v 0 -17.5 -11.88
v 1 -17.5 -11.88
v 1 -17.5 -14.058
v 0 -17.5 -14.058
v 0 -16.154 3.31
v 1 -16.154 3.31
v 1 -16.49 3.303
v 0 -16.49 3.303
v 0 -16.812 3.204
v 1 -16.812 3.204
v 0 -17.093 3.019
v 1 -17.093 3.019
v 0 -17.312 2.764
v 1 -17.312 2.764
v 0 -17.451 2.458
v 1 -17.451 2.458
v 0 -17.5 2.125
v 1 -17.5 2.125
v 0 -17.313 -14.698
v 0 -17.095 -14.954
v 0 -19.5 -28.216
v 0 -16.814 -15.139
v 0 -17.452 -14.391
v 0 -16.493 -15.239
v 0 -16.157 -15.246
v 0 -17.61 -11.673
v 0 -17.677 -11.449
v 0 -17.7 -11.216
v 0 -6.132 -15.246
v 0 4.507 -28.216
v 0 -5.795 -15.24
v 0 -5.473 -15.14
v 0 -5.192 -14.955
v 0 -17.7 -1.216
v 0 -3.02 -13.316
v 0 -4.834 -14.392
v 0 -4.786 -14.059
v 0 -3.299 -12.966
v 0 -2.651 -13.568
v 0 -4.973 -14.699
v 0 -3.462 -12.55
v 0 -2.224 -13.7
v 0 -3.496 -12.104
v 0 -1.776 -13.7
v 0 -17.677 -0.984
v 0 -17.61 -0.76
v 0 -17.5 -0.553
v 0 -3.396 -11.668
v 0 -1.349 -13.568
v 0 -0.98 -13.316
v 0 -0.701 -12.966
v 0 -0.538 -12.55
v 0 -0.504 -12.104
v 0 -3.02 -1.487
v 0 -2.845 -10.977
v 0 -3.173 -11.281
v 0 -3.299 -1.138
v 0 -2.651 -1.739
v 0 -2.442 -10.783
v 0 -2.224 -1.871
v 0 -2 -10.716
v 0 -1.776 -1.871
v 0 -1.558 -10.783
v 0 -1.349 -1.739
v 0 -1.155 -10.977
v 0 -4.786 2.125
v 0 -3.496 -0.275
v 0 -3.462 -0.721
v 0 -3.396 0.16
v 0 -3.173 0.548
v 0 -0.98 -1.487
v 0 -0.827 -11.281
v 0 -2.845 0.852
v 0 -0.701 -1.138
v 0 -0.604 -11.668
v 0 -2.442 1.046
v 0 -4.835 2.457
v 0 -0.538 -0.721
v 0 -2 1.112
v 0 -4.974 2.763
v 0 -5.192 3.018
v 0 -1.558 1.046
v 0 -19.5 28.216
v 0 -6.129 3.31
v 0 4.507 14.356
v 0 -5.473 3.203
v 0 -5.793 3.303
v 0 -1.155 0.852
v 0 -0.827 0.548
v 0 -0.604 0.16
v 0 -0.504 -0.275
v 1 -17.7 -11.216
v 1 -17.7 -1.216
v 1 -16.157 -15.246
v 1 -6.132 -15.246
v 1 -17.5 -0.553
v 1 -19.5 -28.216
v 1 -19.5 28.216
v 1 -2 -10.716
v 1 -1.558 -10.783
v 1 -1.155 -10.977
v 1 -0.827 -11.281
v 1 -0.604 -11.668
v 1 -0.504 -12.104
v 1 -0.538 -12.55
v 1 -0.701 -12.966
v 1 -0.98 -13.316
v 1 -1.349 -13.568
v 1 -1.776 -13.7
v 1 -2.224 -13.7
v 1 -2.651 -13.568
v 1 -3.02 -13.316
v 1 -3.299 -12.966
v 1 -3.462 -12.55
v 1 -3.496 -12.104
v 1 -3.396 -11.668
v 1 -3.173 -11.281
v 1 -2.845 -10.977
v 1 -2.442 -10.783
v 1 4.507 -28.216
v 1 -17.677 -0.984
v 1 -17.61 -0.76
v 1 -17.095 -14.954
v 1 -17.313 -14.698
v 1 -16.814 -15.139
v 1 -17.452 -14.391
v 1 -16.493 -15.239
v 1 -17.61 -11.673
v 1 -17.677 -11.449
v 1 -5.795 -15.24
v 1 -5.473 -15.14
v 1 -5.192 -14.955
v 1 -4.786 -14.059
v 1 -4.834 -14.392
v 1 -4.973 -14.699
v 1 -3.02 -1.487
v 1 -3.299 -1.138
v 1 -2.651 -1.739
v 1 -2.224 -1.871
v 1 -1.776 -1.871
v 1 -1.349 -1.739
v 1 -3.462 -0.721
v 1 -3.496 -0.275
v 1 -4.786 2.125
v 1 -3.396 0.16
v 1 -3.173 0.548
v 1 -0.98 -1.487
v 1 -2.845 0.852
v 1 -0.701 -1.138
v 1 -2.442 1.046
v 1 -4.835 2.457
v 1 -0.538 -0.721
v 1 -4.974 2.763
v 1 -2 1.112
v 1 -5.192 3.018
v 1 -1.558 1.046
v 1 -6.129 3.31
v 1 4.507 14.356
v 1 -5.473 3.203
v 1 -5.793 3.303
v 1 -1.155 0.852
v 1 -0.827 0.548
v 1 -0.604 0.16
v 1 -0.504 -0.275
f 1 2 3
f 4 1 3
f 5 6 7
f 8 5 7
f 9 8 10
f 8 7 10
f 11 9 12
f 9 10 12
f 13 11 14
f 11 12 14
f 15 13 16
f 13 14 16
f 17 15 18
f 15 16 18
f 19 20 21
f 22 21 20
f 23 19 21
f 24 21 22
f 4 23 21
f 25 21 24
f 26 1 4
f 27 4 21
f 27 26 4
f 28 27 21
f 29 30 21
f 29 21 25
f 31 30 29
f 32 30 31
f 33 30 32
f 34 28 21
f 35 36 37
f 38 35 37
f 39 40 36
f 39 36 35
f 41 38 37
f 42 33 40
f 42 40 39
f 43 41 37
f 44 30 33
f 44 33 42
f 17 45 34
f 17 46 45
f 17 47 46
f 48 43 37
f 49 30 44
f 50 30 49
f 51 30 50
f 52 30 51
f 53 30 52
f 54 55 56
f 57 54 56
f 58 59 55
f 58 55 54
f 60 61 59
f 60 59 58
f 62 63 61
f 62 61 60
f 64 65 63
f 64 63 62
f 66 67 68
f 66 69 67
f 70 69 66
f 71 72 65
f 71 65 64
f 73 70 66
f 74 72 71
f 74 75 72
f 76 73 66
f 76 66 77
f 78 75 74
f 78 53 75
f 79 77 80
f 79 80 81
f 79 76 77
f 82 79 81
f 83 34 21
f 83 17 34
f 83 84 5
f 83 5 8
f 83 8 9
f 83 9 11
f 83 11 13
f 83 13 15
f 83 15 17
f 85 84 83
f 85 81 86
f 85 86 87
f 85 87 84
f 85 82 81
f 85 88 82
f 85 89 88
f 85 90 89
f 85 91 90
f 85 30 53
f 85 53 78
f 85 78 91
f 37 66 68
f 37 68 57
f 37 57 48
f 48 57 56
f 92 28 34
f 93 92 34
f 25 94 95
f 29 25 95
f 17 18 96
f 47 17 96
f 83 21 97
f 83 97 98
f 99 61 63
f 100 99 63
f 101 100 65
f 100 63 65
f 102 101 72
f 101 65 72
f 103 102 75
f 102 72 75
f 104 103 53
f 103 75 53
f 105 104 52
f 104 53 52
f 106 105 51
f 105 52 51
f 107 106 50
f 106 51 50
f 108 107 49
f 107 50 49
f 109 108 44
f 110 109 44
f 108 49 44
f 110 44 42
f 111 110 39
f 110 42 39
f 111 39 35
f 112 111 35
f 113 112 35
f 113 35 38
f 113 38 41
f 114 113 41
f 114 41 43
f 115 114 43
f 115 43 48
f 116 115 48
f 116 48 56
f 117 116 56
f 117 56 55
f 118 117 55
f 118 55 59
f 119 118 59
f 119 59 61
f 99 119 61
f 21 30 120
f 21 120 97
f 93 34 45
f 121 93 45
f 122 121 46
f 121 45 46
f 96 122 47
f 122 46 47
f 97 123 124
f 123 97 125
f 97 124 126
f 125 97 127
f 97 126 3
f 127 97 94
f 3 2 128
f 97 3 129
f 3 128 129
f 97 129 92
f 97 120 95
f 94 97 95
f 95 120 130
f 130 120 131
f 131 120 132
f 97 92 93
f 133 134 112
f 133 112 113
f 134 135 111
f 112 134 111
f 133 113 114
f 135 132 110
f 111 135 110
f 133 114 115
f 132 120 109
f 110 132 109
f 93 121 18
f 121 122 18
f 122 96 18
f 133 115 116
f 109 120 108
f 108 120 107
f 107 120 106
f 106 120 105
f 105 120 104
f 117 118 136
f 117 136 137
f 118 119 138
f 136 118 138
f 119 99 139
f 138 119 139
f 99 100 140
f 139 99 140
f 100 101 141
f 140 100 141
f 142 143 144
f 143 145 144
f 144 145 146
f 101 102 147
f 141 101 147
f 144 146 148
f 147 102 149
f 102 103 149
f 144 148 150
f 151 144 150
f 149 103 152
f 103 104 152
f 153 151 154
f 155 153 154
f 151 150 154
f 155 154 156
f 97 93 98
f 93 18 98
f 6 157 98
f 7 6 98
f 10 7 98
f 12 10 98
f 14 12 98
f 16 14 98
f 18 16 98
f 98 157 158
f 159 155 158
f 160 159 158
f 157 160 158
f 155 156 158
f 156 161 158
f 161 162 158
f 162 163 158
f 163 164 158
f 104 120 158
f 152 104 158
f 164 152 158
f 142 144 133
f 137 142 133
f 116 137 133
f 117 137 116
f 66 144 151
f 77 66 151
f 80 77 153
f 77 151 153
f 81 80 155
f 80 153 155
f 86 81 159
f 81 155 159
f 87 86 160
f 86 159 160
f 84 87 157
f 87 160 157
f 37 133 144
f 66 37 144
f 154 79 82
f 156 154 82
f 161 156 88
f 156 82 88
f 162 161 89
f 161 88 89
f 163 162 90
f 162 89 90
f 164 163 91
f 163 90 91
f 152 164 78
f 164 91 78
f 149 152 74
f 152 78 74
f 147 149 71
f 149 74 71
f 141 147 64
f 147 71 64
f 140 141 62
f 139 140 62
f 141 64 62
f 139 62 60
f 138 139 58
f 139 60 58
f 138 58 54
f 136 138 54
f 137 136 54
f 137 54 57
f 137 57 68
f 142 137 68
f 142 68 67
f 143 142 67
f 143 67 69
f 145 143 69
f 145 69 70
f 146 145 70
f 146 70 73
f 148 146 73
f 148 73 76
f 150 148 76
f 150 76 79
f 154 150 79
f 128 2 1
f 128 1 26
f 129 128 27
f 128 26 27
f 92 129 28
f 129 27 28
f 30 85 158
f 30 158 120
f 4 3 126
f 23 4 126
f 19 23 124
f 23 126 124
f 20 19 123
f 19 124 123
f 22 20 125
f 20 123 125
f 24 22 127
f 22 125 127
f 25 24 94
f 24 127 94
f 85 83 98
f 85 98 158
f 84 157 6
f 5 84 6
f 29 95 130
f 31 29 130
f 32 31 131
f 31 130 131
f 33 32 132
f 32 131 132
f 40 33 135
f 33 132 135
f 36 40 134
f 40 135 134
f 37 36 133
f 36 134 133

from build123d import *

# Parameters (mm, degrees)
EXTRUDE_1_DEPTH     = 1
CUT_EXTRUDE_1_DEPTH = 35.313434576
SKETCH_5_R          = 1.5
CUT_EXTRUDE_2_DEPTH = 35.313434576
CUT_EXTRUDE1_DEPTH  = 1


with BuildPart() as part:
    # Эскиз1 → Бобышка-Вытянуть1 (new body)
    with BuildSketch(Plane(origin=(0, 0, 0), x_dir=(0, 0, -1), z_dir=(1, 0, 0))):
        Polygon((28.216339104, 4.507181273), (28.216339104, -19.5), (-28.216339104, -19.5), (-14.355786533, 4.507181273), align=None)
    extrude(amount=EXTRUDE_1_DEPTH)

    # Эскиз3 → Вырез-Вытянуть1 (cut, through all)
    with BuildSketch(Plane.ZY):
        with BuildLine():
            Line((-1.216339104, -7.8), (-11.216339104, -7.8))
            ThreePointArc((-11.216339104, -7.8), (-12.064867241, -8.151471863), (-12.416339104, -9))
            Line((-12.416339104, -9), (-12.416339104, -16.5))
            ThreePointArc((-12.416339104, -16.5), (-12.064867241, -17.348528137), (-11.216339104, -17.7))
            Line((-11.216339104, -17.7), (-1.216339104, -17.7))
            ThreePointArc((-1.216339104, -17.7), (-0.367810966, -17.348528137), (-0.016339104, -16.5))
            Line((-0.016339104, -16.5), (-0.016339104, -9))
            ThreePointArc((-0.016339104, -9), (-0.367810966, -8.151471863), (-1.216339104, -7.8))
        make_face()
    extrude(amount=-CUT_EXTRUDE_1_DEPTH, mode=Mode.SUBTRACT)

    # Эскиз5 → Вырез-Вытянуть2 (cut, through all)
    with BuildSketch(Plane.ZY):
        with Locations((-12.216339104, -2)):
            Circle(SKETCH_5_R)
        with Locations((-0.387535442, -2)):
            Circle(SKETCH_5_R)
    extrude(amount=-CUT_EXTRUDE_2_DEPTH, mode=Mode.SUBTRACT)

    # Sketch2 → Cut-Extrude1 (cut)
    with BuildSketch(Plane(origin=(1, 0, 0), x_dir=(0, 0, -1), z_dir=(1, 0, 0))):
        with BuildLine():
            Line((14.058648973, -4.786), (-2.125047218, -4.786))
            ThreePointArc((-2.125047218, -4.786), (-3.018111901, -5.192151072), (-3.309660896, -6.12891273))
            Line((-3.309660896, -6.12891273), (-3.309660896, -16.154222982))
            ThreePointArc((-3.309660896, -16.154222982), (-3.019412686, -17.092766498), (-2.125394323, -17.5))
            Line((-2.125394323, -17.5), (14.058301867, -17.5))
            ThreePointArc((14.058301867, -17.5), (14.95365068, -17.095122111), (15.246339104, -16.157087417))
            Line((15.246339104, -16.157087417), (15.246339104, -6.131777166))
            ThreePointArc((15.246339104, -6.131777166), (14.95495311, -5.191959061), (14.058648973, -4.786))
        make_face()
    extrude(amount=-CUT_EXTRUDE1_DEPTH, mode=Mode.SUBTRACT)


solid = part.part
